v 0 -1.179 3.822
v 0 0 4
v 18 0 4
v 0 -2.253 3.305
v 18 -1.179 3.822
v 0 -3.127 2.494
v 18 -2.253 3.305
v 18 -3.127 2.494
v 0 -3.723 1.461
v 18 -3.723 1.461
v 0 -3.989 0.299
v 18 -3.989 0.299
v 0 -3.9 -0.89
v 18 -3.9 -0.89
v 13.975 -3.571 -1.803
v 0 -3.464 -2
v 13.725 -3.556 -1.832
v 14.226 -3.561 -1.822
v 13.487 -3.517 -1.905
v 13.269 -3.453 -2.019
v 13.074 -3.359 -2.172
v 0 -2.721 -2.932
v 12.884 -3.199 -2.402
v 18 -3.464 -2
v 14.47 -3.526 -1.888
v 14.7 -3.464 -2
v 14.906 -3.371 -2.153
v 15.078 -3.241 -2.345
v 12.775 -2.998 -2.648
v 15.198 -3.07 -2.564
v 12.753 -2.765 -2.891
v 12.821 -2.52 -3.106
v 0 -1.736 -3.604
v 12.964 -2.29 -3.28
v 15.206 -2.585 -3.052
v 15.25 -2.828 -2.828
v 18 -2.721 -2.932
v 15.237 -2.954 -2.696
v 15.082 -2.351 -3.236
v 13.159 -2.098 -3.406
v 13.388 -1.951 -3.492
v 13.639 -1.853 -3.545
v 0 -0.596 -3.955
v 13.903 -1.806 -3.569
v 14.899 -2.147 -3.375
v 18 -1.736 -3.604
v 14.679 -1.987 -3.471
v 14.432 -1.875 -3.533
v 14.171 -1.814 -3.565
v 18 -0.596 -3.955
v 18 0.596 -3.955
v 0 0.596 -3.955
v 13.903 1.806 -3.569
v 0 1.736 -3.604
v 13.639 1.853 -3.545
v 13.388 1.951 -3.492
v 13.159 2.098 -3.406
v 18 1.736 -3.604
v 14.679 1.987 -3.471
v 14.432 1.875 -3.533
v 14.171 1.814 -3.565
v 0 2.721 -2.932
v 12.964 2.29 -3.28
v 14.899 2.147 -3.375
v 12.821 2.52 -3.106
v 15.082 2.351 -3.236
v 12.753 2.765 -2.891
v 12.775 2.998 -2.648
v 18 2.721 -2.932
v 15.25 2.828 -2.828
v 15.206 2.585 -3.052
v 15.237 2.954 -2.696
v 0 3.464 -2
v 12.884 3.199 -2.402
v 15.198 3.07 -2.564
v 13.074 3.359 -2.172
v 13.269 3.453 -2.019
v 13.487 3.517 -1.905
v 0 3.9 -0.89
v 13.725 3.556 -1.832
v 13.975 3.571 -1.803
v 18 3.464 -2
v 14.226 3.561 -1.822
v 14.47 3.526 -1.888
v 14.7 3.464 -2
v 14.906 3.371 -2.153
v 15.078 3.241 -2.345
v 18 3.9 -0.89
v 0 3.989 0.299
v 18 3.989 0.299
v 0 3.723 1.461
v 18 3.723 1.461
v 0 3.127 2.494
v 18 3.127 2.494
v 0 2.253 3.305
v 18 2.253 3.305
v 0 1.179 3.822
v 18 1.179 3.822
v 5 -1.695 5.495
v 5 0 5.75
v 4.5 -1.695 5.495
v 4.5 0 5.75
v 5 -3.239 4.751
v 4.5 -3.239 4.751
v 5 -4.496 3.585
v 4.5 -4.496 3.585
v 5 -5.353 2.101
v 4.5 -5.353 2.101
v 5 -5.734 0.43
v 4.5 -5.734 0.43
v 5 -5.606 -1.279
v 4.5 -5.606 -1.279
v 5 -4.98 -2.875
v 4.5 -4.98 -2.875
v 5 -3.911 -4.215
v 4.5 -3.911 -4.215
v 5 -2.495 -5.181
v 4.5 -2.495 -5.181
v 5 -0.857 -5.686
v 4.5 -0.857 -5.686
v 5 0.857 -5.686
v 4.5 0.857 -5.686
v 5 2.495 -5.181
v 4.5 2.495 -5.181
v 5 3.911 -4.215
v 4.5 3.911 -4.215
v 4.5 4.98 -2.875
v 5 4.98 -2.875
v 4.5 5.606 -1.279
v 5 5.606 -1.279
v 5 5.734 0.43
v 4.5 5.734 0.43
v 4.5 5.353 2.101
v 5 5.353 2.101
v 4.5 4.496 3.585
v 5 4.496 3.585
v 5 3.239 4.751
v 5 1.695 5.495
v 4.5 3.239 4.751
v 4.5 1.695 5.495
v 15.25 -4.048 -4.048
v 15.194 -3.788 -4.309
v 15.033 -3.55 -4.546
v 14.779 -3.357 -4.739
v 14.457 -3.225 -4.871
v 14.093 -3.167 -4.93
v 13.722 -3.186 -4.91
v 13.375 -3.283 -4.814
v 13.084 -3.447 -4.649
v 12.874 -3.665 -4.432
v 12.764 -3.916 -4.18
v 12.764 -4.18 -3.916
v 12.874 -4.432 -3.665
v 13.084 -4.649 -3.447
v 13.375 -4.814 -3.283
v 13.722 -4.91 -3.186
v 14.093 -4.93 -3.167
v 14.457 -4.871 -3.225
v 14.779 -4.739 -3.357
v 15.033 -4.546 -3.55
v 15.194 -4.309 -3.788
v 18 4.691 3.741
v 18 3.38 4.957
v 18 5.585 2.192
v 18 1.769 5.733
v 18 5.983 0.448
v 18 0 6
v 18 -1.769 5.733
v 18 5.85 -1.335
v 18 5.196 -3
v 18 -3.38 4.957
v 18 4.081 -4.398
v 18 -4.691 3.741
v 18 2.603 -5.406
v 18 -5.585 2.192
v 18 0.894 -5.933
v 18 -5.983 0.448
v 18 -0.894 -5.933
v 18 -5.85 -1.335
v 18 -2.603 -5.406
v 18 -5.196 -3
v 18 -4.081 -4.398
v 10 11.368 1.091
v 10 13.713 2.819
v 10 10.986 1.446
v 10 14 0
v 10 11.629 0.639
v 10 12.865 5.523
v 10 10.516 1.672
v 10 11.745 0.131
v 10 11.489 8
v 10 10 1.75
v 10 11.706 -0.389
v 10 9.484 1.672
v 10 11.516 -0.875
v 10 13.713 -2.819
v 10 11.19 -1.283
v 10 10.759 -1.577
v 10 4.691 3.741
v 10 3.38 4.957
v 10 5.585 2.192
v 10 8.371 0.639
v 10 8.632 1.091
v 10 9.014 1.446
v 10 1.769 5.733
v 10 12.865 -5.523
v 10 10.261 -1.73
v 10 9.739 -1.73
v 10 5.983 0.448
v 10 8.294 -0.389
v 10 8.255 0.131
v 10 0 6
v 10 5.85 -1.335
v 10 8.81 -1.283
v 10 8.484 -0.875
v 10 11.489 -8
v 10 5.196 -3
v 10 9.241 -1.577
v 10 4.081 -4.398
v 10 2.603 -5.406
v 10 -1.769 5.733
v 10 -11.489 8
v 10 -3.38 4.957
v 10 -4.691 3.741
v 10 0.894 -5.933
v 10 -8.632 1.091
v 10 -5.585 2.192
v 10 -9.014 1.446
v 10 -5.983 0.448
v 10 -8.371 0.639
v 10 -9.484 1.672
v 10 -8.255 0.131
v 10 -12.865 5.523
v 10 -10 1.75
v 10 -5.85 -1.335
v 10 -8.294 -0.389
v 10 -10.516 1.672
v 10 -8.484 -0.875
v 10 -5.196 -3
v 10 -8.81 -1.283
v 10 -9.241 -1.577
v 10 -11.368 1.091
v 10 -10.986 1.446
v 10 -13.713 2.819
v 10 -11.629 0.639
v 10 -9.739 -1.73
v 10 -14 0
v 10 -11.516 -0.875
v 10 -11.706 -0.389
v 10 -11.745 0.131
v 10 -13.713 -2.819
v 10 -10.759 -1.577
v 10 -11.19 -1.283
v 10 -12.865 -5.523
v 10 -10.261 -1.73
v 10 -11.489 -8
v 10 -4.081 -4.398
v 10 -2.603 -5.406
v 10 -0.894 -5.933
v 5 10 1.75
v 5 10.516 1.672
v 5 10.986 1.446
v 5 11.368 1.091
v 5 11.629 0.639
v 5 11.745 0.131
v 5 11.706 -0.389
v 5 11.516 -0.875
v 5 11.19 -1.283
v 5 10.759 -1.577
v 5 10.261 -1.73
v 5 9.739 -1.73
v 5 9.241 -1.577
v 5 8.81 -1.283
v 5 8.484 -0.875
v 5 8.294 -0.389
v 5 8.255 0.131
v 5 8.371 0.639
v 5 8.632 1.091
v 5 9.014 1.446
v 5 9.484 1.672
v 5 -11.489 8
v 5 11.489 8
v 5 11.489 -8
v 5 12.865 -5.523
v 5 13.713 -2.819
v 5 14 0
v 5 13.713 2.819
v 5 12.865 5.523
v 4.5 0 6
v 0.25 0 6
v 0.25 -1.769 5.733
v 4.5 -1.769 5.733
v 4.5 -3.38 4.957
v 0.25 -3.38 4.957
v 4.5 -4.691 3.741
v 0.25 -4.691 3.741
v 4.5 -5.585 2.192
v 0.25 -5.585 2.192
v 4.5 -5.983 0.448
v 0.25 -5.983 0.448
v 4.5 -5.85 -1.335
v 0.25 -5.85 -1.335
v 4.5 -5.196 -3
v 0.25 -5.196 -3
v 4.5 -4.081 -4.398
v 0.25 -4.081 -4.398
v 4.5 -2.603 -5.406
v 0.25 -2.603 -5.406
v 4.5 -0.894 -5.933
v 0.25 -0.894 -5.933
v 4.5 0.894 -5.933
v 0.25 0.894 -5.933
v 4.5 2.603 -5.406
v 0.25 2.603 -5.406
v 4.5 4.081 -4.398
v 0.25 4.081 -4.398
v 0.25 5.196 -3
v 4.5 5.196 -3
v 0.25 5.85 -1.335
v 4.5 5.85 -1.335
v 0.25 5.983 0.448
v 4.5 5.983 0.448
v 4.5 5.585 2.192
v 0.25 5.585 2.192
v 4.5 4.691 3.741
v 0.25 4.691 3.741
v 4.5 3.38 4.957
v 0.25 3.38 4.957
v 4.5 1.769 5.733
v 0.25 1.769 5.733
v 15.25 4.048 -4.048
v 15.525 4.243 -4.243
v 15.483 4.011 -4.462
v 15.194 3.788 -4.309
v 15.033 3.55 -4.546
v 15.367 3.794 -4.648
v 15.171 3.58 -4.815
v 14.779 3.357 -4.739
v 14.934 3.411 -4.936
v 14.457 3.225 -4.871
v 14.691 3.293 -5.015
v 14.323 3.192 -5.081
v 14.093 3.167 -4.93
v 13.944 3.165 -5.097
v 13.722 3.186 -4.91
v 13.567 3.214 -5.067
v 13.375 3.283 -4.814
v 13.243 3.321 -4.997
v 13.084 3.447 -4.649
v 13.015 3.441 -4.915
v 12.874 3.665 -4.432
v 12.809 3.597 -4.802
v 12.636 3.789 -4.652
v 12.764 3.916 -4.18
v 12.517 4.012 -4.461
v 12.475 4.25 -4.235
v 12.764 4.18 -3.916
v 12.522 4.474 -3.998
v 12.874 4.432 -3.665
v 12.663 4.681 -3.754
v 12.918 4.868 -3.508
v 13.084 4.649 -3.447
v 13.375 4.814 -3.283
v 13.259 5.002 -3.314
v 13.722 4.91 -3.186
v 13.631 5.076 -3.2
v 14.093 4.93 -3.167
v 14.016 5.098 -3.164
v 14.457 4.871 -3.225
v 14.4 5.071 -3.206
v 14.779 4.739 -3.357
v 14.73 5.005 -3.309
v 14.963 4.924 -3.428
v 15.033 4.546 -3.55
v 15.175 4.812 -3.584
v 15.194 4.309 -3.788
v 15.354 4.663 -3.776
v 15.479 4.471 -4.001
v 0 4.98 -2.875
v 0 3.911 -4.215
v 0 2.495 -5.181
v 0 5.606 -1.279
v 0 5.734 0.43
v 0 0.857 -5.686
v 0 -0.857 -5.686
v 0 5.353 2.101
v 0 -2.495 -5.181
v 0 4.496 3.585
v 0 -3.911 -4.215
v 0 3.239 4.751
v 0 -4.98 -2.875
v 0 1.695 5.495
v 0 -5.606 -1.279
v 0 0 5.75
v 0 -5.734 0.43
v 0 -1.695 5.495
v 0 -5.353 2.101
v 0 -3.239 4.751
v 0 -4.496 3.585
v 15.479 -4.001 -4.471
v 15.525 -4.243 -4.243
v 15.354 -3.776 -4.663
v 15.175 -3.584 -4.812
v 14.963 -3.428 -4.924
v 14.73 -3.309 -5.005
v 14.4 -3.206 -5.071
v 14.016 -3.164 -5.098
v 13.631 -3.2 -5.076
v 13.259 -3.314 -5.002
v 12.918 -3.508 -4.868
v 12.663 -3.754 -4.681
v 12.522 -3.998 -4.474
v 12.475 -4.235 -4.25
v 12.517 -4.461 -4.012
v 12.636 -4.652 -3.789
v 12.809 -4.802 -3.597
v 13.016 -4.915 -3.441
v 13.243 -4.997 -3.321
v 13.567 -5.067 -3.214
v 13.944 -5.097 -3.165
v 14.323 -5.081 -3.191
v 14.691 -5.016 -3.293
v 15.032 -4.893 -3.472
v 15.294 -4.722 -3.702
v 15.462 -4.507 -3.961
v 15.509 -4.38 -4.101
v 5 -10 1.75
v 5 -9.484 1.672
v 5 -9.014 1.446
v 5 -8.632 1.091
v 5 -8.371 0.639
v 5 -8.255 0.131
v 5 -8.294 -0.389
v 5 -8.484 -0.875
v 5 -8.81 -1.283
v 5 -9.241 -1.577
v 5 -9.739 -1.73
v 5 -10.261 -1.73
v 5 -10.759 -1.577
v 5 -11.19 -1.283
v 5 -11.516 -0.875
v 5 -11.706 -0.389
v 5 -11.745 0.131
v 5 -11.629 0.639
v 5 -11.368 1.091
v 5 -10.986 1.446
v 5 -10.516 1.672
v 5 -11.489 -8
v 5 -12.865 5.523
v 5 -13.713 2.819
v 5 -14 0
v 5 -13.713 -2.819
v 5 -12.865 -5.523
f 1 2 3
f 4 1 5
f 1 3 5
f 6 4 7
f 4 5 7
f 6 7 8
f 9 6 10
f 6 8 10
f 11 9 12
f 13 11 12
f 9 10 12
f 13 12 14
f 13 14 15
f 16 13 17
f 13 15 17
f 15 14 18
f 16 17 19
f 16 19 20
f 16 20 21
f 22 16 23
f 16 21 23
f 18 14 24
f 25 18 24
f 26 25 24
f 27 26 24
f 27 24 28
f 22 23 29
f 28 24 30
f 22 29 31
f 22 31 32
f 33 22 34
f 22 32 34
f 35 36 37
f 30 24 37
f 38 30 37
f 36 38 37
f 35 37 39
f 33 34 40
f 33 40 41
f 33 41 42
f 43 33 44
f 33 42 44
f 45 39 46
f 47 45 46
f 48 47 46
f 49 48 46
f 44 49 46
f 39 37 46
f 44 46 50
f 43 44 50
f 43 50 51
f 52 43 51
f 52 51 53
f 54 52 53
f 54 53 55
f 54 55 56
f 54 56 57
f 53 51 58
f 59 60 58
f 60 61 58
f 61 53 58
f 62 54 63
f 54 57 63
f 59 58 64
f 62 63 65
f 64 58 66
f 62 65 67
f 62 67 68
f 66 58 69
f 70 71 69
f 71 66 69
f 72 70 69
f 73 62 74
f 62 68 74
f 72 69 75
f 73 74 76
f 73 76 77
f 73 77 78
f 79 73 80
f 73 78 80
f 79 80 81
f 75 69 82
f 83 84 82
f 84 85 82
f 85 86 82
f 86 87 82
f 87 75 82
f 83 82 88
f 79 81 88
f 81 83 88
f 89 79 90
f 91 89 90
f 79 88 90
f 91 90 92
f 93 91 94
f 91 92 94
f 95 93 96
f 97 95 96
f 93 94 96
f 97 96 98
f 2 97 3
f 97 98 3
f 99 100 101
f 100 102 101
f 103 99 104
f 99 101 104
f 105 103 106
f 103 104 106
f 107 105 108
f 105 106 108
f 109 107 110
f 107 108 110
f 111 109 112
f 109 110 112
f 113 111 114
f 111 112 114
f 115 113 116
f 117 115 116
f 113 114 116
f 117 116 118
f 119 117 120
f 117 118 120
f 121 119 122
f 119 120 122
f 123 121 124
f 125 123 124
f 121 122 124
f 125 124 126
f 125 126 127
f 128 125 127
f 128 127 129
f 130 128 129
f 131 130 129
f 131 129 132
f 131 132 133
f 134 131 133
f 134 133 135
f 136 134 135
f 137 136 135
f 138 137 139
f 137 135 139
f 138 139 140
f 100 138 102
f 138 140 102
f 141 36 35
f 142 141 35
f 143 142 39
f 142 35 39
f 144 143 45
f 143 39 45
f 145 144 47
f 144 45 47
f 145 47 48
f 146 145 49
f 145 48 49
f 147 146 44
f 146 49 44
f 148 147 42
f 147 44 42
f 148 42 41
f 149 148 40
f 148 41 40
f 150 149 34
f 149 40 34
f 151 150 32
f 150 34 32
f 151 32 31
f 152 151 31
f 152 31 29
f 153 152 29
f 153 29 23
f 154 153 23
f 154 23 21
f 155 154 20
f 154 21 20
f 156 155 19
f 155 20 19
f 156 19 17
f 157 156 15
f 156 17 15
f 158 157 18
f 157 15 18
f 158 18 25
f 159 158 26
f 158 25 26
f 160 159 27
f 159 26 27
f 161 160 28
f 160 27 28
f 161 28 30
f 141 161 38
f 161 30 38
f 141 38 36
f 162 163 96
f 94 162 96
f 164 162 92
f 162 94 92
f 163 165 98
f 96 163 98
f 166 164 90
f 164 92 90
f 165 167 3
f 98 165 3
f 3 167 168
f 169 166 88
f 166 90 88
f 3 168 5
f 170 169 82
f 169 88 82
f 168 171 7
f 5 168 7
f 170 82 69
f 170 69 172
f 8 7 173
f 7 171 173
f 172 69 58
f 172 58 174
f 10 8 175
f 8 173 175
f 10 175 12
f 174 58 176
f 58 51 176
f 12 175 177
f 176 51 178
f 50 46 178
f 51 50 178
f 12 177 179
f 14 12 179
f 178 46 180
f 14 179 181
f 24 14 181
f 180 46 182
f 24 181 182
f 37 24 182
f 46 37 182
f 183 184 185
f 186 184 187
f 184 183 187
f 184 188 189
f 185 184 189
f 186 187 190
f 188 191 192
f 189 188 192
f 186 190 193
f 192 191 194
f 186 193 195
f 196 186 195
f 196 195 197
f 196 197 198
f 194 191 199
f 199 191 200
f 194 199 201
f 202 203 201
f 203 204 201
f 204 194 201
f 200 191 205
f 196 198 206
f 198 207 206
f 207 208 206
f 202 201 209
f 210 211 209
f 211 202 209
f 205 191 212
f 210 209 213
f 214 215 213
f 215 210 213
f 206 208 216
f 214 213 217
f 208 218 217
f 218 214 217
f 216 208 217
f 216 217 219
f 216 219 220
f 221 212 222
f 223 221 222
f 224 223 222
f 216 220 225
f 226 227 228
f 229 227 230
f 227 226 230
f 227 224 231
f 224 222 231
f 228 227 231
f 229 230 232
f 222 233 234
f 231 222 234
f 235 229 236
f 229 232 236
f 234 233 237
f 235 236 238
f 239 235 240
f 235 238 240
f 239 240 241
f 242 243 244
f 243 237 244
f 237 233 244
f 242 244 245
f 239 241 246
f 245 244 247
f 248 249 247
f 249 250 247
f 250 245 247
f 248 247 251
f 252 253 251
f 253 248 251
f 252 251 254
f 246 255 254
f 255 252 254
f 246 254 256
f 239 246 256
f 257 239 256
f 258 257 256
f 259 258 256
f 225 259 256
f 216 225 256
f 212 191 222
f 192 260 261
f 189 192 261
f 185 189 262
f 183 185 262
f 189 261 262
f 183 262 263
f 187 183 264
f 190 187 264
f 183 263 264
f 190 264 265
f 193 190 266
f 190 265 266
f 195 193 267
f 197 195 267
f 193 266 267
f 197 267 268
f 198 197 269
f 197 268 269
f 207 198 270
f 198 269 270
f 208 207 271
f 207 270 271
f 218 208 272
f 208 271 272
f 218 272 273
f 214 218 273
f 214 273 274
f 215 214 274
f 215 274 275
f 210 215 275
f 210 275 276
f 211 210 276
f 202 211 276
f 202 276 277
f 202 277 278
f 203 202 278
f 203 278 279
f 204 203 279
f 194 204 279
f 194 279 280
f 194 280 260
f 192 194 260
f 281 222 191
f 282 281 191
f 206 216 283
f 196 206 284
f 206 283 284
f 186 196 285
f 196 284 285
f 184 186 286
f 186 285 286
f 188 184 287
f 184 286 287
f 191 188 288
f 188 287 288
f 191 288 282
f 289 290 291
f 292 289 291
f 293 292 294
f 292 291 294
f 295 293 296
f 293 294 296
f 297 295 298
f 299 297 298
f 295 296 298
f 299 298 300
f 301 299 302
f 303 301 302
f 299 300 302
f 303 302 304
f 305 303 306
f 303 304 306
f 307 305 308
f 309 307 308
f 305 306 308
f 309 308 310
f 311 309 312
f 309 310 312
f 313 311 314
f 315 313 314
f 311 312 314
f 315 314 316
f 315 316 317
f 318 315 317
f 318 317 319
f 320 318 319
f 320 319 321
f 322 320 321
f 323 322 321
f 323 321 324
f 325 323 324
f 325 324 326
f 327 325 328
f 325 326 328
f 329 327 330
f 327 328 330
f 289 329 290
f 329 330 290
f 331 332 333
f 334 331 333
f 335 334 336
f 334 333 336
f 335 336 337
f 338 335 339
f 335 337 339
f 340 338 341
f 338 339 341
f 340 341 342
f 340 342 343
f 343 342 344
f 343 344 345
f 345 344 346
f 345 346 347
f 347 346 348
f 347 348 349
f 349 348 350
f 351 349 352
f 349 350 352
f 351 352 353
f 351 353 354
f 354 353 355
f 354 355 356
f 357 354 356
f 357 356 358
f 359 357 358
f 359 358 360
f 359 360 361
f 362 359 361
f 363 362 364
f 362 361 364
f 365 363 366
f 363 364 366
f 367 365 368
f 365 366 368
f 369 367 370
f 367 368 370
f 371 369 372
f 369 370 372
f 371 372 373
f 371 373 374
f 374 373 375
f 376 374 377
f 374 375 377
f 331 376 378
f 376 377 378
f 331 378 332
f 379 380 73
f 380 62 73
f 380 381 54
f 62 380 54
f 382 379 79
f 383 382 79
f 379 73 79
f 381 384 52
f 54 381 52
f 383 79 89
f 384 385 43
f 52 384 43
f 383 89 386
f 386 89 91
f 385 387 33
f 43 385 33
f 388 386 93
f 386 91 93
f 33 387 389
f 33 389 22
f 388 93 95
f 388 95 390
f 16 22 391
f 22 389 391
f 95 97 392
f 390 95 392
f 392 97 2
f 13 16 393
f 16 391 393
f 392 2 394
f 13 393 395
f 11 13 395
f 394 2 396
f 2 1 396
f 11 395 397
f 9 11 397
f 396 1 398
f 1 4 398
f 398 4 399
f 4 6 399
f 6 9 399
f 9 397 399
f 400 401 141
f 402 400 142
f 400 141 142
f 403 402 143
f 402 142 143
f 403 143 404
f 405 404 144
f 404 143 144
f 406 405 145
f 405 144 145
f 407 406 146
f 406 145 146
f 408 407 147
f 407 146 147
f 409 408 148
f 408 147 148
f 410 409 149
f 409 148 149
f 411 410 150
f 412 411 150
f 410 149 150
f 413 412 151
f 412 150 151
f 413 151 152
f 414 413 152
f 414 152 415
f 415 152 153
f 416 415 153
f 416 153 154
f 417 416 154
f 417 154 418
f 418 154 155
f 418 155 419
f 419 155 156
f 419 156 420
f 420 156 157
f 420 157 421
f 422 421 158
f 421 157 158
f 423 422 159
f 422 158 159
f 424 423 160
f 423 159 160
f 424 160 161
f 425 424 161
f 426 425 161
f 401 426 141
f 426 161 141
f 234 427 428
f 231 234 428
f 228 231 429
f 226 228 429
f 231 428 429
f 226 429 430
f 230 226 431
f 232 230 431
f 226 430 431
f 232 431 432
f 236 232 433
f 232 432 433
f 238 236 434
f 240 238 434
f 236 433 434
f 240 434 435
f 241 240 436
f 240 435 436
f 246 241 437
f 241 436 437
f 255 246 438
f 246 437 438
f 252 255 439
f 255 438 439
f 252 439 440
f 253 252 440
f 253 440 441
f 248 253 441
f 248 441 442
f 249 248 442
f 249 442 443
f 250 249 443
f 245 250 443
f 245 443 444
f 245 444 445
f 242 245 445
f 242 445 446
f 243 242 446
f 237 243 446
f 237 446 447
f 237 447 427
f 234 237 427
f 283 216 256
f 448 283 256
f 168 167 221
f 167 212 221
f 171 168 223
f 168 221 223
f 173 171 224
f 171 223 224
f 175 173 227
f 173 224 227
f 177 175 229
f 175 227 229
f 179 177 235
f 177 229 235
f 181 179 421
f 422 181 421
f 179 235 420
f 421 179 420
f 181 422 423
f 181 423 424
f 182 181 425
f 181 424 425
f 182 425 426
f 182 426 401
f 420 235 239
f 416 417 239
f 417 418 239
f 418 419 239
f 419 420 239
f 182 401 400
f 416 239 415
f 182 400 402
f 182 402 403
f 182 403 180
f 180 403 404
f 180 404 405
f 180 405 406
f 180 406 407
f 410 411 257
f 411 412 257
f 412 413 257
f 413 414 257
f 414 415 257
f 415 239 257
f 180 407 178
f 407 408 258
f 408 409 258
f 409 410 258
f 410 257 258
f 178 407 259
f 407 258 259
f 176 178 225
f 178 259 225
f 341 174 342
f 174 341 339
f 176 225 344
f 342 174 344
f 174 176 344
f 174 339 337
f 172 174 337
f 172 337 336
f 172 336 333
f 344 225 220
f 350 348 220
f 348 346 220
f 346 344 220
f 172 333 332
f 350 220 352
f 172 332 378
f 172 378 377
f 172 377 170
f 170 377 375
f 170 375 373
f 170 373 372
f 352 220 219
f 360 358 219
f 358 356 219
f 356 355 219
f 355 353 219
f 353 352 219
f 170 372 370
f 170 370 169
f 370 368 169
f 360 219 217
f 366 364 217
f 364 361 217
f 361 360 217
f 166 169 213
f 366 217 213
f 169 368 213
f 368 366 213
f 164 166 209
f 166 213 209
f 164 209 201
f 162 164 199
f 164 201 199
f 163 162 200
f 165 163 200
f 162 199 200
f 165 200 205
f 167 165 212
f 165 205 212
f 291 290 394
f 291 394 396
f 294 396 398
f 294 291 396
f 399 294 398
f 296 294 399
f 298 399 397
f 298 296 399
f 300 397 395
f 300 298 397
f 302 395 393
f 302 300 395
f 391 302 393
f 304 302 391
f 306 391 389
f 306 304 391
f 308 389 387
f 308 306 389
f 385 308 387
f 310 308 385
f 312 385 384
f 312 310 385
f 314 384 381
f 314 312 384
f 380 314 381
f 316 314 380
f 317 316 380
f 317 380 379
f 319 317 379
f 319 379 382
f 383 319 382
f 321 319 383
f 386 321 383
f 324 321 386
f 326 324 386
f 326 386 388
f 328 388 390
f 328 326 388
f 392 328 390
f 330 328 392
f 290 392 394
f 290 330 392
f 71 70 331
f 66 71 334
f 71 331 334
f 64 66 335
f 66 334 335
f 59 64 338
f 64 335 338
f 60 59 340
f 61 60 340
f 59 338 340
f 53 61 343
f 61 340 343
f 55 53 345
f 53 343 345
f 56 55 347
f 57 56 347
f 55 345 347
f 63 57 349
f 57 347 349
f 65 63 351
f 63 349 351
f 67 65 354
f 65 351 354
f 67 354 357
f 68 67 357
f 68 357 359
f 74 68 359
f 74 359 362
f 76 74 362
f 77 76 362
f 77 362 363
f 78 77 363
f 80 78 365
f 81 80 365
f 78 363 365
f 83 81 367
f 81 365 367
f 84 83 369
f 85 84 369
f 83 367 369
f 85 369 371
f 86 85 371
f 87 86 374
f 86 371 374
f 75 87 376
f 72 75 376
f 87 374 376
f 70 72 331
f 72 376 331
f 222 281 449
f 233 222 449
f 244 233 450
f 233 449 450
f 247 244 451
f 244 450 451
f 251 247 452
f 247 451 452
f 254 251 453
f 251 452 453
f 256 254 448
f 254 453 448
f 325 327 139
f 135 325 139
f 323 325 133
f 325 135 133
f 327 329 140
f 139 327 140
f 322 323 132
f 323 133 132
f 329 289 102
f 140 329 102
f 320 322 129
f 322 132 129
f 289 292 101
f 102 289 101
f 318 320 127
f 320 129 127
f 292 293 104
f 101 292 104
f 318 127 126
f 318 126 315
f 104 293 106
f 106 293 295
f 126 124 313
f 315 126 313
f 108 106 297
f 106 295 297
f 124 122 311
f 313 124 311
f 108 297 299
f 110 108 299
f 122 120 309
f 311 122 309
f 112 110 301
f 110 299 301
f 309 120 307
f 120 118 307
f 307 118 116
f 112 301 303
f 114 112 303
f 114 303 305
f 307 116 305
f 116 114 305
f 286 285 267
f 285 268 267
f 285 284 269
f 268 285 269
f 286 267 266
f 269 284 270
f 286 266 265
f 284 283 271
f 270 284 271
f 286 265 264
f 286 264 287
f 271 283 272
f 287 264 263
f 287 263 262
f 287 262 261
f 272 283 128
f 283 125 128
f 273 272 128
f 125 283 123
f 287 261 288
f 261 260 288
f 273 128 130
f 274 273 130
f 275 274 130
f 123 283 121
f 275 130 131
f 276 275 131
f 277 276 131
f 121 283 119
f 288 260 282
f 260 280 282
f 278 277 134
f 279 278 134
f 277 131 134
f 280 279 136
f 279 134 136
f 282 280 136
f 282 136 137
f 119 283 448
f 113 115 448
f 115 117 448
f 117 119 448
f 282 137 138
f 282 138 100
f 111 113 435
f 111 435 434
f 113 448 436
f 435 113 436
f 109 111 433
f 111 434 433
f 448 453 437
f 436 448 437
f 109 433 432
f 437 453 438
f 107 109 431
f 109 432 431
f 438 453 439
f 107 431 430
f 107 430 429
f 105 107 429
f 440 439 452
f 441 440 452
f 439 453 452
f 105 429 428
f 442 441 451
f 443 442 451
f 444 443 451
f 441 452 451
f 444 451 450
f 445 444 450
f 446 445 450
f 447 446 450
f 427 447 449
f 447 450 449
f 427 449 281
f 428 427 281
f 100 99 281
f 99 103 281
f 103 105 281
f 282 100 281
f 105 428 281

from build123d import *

# Parameters (mm, degrees)
CUT_EXTRUDE_1_DEPTH = 23.181073013
CHAMFER_1_SIZE      = 0.25
HOLE_WIZARD_1_D     = 3.5


# Read off the part's stored shape, not the designer's step: M3 螺纹孔3
with BuildPart() as part:
    # 草图2 → 旋转1 (revolve)
    with BuildSketch(Plane.XY, mode=Mode.PRIVATE) as revolve_1_sk:
        Polygon((18, 4), (18, 6), (10, 6), (10, 14), (5, 14), (5, 5.75), (4.5, 5.75), (4.5, 6), (0, 6), (0, 4), align=None)
    revolve(revolve_1_sk.sketch.rotate(Axis((0, 0, 0), (1, 0, 0)), 90), axis=Axis((0, 0, 0), (1, 0, 0)))

    # 草图3 → 切除-拉伸1 (cut, through all)
    with BuildSketch(Plane(origin=(10, 0, 0), x_dir=(0, 0, -1), z_dir=(1, 0, 0))):
        with BuildLine():
            Line((-8, -11.489125293), (-8, 11.489125293))
            ThreePointArc((-8, 11.489125293), (-14, 0), (-8, -11.489125293))
        make_face()
        with BuildLine():
            ThreePointArc((14, 0), (12.409673646, 6.480740698), (8, 11.489125293))
            Line((8, 11.489125293), (8, -11.489125293))
            ThreePointArc((8, -11.489125293), (12.409673646, -6.480740698), (14, 0))
        make_face()
    extrude(amount=-CUT_EXTRUDE_1_DEPTH, mode=Mode.SUBTRACT)

    # 倒角1
    chamfer_1_edges = [part.edges().sort_by_distance(p)[0] for p in [
        (0, 0, -6),
    ]]
    chamfer(chamfer_1_edges, length=CHAMFER_1_SIZE)

    # 孔1 (through all)
    with Locations(Plane(origin=(10, 0, 0), x_dir=(0, 0, -1), z_dir=(1, 0, 0))):
        with Locations((0, 10), (0, -10)):
            Hole(HOLE_WIZARD_1_D / 2)

    # M3 螺纹孔3 outline → M3 螺纹孔3 (revolve, cut)
    with BuildSketch(Plane(origin=(14, 0, 0), x_dir=(1, 0, 0), z_dir=(0, 0.707106781186545, 0.70710678118655))):
        Polygon((1.525087405, 6.000087405), (0, 6.000087405), (0, 3.799554737), (1.25, 3.799554737), (1.25, 5.725), align=None)
    revolve(axis=Axis((14, 0, 0), (0, 0.70710678118655, -0.707106781186545)), mode=Mode.SUBTRACT)

    # Hole Wizard M3 _3 2 outline → Hole Wizard M3 _3 2 (revolve, cut)
    with BuildSketch(Plane(origin=(14, 0, 0), x_dir=(1, 0, 0), z_dir=(0, -0.707106781186542, 0.707106781186553))):
        Polygon((0, -6.000094082), (1.525094082, -6.000094082), (1.25, -5.725), (1.25, -3.799554737), (0, -3.799554737), align=None)
    revolve(axis=Axis((14, 0, 0), (0, 0.707106781186553, 0.707106781186542)), mode=Mode.SUBTRACT)


solid = part.part
